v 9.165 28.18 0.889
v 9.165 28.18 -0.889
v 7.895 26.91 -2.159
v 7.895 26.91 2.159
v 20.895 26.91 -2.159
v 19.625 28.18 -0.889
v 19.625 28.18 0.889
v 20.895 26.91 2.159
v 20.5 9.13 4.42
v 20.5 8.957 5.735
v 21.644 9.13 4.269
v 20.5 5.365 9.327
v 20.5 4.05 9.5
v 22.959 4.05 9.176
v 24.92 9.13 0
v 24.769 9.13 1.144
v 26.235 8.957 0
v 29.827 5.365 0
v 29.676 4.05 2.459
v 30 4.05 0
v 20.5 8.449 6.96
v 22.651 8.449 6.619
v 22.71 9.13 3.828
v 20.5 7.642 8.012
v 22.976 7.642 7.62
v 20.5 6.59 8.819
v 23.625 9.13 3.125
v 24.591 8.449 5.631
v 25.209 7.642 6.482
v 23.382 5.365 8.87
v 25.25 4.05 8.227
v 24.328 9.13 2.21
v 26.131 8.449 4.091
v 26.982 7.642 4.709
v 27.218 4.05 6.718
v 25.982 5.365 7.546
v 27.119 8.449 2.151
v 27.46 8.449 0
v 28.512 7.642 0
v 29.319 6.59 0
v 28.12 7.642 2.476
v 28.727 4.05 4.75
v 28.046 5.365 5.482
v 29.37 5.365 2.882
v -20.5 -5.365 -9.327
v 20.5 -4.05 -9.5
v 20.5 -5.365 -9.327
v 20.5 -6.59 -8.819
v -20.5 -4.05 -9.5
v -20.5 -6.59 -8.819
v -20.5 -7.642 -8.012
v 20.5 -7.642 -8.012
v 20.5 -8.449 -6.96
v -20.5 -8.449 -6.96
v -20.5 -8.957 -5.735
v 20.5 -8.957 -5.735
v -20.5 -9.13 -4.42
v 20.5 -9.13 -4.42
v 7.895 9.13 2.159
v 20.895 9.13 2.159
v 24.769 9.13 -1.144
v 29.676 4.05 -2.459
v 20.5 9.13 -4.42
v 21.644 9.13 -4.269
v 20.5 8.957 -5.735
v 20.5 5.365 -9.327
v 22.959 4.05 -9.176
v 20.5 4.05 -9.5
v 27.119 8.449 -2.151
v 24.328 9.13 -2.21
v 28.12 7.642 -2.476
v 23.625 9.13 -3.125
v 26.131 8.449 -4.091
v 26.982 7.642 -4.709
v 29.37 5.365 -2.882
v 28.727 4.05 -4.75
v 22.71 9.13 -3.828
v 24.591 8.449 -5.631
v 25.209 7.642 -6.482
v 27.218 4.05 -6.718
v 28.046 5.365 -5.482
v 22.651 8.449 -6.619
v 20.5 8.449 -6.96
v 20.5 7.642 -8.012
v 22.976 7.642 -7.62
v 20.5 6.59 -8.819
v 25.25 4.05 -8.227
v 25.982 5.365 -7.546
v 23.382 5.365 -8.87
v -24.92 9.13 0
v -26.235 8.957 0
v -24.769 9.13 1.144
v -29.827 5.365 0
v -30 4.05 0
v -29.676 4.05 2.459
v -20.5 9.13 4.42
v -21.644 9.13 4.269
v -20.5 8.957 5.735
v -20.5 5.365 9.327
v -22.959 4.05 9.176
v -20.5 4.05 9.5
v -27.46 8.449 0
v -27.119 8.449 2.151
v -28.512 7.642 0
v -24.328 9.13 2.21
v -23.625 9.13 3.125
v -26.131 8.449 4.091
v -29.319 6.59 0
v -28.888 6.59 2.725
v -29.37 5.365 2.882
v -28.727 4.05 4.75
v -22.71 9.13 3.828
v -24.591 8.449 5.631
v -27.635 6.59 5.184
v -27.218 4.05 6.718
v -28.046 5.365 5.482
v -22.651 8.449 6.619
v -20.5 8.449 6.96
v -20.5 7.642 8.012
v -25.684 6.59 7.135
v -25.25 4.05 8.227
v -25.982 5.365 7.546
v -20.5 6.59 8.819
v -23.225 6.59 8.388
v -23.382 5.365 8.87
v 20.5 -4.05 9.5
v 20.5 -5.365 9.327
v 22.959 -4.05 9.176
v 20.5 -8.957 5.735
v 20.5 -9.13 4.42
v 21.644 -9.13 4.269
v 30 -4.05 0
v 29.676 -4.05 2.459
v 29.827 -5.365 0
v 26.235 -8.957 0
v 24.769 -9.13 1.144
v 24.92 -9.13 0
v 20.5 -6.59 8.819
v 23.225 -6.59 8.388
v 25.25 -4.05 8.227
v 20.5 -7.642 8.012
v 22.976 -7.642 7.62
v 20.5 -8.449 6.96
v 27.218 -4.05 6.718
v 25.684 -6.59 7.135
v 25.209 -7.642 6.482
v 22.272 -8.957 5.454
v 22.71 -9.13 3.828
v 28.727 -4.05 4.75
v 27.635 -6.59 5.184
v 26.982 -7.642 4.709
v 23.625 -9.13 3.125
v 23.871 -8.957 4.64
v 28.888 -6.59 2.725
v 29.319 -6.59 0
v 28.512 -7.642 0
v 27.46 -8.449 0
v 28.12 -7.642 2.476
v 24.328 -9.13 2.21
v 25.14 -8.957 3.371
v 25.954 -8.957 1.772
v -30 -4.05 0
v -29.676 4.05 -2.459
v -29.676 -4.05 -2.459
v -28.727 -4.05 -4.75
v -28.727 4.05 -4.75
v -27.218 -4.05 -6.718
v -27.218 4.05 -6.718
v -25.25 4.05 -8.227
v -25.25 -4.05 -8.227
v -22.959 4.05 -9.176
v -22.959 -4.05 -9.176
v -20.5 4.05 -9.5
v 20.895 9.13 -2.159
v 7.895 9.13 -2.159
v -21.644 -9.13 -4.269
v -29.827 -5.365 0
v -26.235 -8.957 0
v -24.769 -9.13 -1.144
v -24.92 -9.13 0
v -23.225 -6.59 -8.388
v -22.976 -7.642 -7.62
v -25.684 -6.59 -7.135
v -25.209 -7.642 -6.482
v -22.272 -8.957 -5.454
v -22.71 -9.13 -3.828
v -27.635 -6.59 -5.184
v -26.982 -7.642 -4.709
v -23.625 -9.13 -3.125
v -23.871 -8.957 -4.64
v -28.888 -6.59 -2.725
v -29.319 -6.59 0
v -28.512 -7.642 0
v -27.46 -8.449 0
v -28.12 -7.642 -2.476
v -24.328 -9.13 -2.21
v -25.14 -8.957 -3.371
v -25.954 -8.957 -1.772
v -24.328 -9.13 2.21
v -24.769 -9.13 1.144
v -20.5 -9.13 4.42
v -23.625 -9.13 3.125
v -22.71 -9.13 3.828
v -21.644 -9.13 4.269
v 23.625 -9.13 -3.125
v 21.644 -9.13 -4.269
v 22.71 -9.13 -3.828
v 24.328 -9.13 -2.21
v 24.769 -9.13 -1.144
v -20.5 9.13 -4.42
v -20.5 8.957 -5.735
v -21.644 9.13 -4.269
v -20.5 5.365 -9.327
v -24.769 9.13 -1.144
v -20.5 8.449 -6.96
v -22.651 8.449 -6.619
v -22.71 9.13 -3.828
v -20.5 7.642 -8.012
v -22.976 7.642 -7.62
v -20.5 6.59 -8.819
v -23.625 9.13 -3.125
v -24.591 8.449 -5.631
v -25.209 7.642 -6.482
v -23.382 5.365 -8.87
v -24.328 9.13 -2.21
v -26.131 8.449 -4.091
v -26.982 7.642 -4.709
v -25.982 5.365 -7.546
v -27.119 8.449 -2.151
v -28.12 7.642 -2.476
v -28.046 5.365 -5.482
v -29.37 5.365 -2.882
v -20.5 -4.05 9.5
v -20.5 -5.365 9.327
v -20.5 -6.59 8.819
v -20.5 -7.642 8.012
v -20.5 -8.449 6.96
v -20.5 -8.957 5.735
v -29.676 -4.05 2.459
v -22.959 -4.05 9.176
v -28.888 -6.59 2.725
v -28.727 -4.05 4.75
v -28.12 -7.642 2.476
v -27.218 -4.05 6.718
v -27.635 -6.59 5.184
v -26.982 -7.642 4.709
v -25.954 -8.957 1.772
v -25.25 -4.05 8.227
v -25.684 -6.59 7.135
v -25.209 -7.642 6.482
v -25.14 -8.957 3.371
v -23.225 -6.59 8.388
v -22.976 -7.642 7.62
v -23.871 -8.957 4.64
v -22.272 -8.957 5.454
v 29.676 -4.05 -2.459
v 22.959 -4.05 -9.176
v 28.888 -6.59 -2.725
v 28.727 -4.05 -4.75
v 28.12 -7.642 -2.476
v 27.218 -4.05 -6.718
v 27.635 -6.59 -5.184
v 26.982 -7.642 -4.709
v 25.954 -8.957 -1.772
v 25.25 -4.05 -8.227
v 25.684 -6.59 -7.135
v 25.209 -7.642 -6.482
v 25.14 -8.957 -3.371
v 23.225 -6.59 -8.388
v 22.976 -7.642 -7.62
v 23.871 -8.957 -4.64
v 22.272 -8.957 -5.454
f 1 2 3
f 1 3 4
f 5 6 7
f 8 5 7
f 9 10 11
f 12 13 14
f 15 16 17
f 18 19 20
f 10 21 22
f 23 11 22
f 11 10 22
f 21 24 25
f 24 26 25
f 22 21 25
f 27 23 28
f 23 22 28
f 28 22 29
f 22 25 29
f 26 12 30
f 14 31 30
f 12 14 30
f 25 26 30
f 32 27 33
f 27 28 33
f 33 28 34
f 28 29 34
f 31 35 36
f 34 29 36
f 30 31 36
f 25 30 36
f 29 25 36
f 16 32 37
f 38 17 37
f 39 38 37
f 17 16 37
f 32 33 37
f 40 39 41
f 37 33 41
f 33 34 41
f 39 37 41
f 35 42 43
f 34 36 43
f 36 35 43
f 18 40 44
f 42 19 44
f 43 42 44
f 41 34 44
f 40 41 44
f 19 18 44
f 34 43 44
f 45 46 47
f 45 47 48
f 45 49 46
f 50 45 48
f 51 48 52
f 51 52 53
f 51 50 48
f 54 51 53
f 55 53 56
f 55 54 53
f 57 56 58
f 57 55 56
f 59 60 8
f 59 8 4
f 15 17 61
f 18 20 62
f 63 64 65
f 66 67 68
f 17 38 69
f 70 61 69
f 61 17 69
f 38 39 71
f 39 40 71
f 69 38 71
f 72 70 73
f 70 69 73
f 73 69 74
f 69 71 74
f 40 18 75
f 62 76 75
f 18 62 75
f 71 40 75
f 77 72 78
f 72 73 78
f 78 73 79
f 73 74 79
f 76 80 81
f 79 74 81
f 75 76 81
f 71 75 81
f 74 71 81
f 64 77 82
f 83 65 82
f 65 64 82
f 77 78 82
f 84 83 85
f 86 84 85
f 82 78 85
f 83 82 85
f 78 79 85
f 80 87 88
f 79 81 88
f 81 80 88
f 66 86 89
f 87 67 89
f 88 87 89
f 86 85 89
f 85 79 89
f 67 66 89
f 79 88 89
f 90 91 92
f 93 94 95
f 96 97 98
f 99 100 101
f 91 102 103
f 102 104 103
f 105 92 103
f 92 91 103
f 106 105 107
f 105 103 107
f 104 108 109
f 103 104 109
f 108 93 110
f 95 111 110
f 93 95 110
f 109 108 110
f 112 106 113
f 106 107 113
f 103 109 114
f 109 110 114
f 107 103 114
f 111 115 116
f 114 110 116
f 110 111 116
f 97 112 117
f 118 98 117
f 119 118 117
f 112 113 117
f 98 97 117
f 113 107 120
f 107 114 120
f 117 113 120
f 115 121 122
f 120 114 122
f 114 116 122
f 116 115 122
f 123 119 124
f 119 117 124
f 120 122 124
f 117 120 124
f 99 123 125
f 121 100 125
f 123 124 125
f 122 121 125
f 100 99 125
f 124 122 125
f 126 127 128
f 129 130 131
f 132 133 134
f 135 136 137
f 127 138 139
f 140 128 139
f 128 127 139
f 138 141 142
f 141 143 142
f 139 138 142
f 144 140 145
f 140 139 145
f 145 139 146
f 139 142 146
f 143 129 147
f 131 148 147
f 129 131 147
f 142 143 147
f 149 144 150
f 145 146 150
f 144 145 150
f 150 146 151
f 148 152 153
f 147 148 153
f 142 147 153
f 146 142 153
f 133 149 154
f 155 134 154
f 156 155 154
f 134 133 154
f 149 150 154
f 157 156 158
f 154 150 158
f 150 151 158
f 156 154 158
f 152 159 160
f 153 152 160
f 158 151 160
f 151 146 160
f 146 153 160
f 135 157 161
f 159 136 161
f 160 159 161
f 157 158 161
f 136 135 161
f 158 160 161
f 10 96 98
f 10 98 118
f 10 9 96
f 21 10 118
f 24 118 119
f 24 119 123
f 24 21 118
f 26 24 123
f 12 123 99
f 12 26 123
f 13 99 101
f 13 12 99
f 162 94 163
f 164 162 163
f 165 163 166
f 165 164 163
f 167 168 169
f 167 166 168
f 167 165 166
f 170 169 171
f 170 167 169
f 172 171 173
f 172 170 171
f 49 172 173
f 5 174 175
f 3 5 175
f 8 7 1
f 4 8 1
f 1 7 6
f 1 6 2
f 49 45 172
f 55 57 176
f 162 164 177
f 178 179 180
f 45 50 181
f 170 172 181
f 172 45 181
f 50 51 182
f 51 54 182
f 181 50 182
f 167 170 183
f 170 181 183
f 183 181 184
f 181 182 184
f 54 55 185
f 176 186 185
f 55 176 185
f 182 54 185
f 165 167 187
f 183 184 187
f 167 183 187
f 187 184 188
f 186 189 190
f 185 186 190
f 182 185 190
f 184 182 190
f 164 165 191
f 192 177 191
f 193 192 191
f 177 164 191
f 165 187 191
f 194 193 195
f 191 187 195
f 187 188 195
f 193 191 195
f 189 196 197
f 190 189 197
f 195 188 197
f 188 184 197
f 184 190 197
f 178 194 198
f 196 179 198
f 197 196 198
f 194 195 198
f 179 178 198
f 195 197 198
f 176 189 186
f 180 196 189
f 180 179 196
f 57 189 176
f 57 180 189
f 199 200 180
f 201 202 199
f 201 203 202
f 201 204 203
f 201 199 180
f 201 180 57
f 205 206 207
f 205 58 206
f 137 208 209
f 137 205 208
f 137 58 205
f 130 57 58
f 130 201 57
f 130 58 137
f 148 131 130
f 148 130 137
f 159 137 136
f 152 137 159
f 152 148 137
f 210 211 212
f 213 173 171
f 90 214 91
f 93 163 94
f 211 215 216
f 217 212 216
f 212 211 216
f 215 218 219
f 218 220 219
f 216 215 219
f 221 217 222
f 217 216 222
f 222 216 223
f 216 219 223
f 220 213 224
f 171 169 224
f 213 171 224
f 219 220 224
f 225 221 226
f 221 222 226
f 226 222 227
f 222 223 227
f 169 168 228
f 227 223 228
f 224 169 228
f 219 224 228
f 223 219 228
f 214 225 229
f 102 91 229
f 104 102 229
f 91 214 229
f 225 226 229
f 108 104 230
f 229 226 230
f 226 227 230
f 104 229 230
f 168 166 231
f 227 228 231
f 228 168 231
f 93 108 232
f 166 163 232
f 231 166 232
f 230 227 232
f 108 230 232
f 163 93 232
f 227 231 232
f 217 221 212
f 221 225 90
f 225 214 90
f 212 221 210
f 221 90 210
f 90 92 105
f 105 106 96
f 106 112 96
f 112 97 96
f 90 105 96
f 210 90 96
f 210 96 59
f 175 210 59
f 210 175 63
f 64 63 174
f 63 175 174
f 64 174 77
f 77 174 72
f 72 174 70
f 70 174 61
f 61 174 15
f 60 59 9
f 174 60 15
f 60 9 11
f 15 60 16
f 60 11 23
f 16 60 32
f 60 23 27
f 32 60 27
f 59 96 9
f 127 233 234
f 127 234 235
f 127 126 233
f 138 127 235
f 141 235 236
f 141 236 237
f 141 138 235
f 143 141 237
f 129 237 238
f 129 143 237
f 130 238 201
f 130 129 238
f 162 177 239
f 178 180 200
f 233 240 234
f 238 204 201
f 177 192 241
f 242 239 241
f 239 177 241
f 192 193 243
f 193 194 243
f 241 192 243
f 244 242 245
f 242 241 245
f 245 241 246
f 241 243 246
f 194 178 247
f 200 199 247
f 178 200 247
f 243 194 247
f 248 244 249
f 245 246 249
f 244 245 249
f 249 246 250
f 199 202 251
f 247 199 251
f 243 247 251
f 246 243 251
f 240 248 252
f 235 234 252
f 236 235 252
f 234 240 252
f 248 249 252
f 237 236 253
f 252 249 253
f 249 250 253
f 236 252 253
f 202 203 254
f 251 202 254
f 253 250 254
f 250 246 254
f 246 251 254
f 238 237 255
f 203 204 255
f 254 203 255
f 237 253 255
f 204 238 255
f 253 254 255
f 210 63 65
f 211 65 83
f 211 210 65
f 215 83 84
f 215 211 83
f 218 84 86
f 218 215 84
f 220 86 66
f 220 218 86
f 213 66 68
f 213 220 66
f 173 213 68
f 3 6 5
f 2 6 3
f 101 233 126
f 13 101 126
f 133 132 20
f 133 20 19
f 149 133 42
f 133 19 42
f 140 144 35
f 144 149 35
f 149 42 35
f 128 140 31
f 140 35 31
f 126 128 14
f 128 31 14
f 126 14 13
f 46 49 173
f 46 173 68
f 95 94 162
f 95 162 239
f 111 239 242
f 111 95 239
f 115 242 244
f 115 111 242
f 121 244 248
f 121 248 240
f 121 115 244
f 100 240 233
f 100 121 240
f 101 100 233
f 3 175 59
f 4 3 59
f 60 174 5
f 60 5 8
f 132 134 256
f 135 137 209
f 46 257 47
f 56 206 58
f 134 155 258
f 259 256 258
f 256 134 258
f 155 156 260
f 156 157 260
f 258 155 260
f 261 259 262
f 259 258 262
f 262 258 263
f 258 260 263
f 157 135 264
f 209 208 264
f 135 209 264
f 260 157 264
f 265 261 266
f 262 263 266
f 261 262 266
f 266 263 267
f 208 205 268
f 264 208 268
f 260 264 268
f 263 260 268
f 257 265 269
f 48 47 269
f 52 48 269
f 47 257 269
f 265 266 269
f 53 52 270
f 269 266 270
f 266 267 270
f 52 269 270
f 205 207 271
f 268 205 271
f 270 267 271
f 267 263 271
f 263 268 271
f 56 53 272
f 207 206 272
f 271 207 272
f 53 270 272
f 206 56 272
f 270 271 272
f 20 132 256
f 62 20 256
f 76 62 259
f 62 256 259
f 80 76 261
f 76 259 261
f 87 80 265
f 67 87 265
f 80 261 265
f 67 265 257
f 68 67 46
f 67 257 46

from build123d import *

# Parameters (mm, degrees)
F0_W     = 60
F0_H     = 19
F1_DEPTH = 9.13
F2_R     = 9.49999
F3_W     = 13
F3_H     = 4.318
F4_DEPTH = 19.05
F5_SIZE  = 1.27
F6_R     = 5.08


# Not quite as in the source:
# - a fillet or chamfer is up to 0.001 mm smaller than in the source, because OpenCascade refuses the exact size


with BuildPart() as f1:
    # F0 (on Front) → F1 (new body, symmetric)
    with BuildSketch(Plane.XZ):
        Rectangle(F0_W, F0_H)
    extrude(amount=F1_DEPTH, both=True)

    # F2 (radius 9.5 in the source; OpenCascade refuses exactly that, so slightly less here)
    f2_edges = [f1.edges().sort_by_distance(p)[0] for p in [
        (30, 0, 9.5),
        (30, 0, -9.5),
        (-30, 0, 9.5),
        (-30, 0, -9.5),
    ]]
    fillet(f2_edges, radius=F2_R)

    # F3 (on face) → F4 (join)
    with BuildSketch(Plane(origin=(0, 9.13, 0), x_dir=(-1, 0, 0), z_dir=(0, 1, 0))):
        with Locations((-14.3949933554, 0)):
            Rectangle(F3_W, F3_H)
    extrude(amount=F4_DEPTH)

    # F5
    f5_edges = [f1.edges().sort_by_distance(p)[0] for p in [
        (14.394993, 28.18, 2.159),
        (20.894993, 28.18, 0),
        (7.894993, 28.18, 0),
        (14.394993, 28.18, -2.159),
    ]]
    chamfer(f5_edges, length=F5_SIZE)

    # F6
    f6_edges = [f1.edges().sort_by_distance(p)[0] for p in [
        (0, 9.13, 9.5),
        (0, -9.13, 9.5),
    ]]
    fillet(f6_edges, radius=F6_R)


solid = f1.part
